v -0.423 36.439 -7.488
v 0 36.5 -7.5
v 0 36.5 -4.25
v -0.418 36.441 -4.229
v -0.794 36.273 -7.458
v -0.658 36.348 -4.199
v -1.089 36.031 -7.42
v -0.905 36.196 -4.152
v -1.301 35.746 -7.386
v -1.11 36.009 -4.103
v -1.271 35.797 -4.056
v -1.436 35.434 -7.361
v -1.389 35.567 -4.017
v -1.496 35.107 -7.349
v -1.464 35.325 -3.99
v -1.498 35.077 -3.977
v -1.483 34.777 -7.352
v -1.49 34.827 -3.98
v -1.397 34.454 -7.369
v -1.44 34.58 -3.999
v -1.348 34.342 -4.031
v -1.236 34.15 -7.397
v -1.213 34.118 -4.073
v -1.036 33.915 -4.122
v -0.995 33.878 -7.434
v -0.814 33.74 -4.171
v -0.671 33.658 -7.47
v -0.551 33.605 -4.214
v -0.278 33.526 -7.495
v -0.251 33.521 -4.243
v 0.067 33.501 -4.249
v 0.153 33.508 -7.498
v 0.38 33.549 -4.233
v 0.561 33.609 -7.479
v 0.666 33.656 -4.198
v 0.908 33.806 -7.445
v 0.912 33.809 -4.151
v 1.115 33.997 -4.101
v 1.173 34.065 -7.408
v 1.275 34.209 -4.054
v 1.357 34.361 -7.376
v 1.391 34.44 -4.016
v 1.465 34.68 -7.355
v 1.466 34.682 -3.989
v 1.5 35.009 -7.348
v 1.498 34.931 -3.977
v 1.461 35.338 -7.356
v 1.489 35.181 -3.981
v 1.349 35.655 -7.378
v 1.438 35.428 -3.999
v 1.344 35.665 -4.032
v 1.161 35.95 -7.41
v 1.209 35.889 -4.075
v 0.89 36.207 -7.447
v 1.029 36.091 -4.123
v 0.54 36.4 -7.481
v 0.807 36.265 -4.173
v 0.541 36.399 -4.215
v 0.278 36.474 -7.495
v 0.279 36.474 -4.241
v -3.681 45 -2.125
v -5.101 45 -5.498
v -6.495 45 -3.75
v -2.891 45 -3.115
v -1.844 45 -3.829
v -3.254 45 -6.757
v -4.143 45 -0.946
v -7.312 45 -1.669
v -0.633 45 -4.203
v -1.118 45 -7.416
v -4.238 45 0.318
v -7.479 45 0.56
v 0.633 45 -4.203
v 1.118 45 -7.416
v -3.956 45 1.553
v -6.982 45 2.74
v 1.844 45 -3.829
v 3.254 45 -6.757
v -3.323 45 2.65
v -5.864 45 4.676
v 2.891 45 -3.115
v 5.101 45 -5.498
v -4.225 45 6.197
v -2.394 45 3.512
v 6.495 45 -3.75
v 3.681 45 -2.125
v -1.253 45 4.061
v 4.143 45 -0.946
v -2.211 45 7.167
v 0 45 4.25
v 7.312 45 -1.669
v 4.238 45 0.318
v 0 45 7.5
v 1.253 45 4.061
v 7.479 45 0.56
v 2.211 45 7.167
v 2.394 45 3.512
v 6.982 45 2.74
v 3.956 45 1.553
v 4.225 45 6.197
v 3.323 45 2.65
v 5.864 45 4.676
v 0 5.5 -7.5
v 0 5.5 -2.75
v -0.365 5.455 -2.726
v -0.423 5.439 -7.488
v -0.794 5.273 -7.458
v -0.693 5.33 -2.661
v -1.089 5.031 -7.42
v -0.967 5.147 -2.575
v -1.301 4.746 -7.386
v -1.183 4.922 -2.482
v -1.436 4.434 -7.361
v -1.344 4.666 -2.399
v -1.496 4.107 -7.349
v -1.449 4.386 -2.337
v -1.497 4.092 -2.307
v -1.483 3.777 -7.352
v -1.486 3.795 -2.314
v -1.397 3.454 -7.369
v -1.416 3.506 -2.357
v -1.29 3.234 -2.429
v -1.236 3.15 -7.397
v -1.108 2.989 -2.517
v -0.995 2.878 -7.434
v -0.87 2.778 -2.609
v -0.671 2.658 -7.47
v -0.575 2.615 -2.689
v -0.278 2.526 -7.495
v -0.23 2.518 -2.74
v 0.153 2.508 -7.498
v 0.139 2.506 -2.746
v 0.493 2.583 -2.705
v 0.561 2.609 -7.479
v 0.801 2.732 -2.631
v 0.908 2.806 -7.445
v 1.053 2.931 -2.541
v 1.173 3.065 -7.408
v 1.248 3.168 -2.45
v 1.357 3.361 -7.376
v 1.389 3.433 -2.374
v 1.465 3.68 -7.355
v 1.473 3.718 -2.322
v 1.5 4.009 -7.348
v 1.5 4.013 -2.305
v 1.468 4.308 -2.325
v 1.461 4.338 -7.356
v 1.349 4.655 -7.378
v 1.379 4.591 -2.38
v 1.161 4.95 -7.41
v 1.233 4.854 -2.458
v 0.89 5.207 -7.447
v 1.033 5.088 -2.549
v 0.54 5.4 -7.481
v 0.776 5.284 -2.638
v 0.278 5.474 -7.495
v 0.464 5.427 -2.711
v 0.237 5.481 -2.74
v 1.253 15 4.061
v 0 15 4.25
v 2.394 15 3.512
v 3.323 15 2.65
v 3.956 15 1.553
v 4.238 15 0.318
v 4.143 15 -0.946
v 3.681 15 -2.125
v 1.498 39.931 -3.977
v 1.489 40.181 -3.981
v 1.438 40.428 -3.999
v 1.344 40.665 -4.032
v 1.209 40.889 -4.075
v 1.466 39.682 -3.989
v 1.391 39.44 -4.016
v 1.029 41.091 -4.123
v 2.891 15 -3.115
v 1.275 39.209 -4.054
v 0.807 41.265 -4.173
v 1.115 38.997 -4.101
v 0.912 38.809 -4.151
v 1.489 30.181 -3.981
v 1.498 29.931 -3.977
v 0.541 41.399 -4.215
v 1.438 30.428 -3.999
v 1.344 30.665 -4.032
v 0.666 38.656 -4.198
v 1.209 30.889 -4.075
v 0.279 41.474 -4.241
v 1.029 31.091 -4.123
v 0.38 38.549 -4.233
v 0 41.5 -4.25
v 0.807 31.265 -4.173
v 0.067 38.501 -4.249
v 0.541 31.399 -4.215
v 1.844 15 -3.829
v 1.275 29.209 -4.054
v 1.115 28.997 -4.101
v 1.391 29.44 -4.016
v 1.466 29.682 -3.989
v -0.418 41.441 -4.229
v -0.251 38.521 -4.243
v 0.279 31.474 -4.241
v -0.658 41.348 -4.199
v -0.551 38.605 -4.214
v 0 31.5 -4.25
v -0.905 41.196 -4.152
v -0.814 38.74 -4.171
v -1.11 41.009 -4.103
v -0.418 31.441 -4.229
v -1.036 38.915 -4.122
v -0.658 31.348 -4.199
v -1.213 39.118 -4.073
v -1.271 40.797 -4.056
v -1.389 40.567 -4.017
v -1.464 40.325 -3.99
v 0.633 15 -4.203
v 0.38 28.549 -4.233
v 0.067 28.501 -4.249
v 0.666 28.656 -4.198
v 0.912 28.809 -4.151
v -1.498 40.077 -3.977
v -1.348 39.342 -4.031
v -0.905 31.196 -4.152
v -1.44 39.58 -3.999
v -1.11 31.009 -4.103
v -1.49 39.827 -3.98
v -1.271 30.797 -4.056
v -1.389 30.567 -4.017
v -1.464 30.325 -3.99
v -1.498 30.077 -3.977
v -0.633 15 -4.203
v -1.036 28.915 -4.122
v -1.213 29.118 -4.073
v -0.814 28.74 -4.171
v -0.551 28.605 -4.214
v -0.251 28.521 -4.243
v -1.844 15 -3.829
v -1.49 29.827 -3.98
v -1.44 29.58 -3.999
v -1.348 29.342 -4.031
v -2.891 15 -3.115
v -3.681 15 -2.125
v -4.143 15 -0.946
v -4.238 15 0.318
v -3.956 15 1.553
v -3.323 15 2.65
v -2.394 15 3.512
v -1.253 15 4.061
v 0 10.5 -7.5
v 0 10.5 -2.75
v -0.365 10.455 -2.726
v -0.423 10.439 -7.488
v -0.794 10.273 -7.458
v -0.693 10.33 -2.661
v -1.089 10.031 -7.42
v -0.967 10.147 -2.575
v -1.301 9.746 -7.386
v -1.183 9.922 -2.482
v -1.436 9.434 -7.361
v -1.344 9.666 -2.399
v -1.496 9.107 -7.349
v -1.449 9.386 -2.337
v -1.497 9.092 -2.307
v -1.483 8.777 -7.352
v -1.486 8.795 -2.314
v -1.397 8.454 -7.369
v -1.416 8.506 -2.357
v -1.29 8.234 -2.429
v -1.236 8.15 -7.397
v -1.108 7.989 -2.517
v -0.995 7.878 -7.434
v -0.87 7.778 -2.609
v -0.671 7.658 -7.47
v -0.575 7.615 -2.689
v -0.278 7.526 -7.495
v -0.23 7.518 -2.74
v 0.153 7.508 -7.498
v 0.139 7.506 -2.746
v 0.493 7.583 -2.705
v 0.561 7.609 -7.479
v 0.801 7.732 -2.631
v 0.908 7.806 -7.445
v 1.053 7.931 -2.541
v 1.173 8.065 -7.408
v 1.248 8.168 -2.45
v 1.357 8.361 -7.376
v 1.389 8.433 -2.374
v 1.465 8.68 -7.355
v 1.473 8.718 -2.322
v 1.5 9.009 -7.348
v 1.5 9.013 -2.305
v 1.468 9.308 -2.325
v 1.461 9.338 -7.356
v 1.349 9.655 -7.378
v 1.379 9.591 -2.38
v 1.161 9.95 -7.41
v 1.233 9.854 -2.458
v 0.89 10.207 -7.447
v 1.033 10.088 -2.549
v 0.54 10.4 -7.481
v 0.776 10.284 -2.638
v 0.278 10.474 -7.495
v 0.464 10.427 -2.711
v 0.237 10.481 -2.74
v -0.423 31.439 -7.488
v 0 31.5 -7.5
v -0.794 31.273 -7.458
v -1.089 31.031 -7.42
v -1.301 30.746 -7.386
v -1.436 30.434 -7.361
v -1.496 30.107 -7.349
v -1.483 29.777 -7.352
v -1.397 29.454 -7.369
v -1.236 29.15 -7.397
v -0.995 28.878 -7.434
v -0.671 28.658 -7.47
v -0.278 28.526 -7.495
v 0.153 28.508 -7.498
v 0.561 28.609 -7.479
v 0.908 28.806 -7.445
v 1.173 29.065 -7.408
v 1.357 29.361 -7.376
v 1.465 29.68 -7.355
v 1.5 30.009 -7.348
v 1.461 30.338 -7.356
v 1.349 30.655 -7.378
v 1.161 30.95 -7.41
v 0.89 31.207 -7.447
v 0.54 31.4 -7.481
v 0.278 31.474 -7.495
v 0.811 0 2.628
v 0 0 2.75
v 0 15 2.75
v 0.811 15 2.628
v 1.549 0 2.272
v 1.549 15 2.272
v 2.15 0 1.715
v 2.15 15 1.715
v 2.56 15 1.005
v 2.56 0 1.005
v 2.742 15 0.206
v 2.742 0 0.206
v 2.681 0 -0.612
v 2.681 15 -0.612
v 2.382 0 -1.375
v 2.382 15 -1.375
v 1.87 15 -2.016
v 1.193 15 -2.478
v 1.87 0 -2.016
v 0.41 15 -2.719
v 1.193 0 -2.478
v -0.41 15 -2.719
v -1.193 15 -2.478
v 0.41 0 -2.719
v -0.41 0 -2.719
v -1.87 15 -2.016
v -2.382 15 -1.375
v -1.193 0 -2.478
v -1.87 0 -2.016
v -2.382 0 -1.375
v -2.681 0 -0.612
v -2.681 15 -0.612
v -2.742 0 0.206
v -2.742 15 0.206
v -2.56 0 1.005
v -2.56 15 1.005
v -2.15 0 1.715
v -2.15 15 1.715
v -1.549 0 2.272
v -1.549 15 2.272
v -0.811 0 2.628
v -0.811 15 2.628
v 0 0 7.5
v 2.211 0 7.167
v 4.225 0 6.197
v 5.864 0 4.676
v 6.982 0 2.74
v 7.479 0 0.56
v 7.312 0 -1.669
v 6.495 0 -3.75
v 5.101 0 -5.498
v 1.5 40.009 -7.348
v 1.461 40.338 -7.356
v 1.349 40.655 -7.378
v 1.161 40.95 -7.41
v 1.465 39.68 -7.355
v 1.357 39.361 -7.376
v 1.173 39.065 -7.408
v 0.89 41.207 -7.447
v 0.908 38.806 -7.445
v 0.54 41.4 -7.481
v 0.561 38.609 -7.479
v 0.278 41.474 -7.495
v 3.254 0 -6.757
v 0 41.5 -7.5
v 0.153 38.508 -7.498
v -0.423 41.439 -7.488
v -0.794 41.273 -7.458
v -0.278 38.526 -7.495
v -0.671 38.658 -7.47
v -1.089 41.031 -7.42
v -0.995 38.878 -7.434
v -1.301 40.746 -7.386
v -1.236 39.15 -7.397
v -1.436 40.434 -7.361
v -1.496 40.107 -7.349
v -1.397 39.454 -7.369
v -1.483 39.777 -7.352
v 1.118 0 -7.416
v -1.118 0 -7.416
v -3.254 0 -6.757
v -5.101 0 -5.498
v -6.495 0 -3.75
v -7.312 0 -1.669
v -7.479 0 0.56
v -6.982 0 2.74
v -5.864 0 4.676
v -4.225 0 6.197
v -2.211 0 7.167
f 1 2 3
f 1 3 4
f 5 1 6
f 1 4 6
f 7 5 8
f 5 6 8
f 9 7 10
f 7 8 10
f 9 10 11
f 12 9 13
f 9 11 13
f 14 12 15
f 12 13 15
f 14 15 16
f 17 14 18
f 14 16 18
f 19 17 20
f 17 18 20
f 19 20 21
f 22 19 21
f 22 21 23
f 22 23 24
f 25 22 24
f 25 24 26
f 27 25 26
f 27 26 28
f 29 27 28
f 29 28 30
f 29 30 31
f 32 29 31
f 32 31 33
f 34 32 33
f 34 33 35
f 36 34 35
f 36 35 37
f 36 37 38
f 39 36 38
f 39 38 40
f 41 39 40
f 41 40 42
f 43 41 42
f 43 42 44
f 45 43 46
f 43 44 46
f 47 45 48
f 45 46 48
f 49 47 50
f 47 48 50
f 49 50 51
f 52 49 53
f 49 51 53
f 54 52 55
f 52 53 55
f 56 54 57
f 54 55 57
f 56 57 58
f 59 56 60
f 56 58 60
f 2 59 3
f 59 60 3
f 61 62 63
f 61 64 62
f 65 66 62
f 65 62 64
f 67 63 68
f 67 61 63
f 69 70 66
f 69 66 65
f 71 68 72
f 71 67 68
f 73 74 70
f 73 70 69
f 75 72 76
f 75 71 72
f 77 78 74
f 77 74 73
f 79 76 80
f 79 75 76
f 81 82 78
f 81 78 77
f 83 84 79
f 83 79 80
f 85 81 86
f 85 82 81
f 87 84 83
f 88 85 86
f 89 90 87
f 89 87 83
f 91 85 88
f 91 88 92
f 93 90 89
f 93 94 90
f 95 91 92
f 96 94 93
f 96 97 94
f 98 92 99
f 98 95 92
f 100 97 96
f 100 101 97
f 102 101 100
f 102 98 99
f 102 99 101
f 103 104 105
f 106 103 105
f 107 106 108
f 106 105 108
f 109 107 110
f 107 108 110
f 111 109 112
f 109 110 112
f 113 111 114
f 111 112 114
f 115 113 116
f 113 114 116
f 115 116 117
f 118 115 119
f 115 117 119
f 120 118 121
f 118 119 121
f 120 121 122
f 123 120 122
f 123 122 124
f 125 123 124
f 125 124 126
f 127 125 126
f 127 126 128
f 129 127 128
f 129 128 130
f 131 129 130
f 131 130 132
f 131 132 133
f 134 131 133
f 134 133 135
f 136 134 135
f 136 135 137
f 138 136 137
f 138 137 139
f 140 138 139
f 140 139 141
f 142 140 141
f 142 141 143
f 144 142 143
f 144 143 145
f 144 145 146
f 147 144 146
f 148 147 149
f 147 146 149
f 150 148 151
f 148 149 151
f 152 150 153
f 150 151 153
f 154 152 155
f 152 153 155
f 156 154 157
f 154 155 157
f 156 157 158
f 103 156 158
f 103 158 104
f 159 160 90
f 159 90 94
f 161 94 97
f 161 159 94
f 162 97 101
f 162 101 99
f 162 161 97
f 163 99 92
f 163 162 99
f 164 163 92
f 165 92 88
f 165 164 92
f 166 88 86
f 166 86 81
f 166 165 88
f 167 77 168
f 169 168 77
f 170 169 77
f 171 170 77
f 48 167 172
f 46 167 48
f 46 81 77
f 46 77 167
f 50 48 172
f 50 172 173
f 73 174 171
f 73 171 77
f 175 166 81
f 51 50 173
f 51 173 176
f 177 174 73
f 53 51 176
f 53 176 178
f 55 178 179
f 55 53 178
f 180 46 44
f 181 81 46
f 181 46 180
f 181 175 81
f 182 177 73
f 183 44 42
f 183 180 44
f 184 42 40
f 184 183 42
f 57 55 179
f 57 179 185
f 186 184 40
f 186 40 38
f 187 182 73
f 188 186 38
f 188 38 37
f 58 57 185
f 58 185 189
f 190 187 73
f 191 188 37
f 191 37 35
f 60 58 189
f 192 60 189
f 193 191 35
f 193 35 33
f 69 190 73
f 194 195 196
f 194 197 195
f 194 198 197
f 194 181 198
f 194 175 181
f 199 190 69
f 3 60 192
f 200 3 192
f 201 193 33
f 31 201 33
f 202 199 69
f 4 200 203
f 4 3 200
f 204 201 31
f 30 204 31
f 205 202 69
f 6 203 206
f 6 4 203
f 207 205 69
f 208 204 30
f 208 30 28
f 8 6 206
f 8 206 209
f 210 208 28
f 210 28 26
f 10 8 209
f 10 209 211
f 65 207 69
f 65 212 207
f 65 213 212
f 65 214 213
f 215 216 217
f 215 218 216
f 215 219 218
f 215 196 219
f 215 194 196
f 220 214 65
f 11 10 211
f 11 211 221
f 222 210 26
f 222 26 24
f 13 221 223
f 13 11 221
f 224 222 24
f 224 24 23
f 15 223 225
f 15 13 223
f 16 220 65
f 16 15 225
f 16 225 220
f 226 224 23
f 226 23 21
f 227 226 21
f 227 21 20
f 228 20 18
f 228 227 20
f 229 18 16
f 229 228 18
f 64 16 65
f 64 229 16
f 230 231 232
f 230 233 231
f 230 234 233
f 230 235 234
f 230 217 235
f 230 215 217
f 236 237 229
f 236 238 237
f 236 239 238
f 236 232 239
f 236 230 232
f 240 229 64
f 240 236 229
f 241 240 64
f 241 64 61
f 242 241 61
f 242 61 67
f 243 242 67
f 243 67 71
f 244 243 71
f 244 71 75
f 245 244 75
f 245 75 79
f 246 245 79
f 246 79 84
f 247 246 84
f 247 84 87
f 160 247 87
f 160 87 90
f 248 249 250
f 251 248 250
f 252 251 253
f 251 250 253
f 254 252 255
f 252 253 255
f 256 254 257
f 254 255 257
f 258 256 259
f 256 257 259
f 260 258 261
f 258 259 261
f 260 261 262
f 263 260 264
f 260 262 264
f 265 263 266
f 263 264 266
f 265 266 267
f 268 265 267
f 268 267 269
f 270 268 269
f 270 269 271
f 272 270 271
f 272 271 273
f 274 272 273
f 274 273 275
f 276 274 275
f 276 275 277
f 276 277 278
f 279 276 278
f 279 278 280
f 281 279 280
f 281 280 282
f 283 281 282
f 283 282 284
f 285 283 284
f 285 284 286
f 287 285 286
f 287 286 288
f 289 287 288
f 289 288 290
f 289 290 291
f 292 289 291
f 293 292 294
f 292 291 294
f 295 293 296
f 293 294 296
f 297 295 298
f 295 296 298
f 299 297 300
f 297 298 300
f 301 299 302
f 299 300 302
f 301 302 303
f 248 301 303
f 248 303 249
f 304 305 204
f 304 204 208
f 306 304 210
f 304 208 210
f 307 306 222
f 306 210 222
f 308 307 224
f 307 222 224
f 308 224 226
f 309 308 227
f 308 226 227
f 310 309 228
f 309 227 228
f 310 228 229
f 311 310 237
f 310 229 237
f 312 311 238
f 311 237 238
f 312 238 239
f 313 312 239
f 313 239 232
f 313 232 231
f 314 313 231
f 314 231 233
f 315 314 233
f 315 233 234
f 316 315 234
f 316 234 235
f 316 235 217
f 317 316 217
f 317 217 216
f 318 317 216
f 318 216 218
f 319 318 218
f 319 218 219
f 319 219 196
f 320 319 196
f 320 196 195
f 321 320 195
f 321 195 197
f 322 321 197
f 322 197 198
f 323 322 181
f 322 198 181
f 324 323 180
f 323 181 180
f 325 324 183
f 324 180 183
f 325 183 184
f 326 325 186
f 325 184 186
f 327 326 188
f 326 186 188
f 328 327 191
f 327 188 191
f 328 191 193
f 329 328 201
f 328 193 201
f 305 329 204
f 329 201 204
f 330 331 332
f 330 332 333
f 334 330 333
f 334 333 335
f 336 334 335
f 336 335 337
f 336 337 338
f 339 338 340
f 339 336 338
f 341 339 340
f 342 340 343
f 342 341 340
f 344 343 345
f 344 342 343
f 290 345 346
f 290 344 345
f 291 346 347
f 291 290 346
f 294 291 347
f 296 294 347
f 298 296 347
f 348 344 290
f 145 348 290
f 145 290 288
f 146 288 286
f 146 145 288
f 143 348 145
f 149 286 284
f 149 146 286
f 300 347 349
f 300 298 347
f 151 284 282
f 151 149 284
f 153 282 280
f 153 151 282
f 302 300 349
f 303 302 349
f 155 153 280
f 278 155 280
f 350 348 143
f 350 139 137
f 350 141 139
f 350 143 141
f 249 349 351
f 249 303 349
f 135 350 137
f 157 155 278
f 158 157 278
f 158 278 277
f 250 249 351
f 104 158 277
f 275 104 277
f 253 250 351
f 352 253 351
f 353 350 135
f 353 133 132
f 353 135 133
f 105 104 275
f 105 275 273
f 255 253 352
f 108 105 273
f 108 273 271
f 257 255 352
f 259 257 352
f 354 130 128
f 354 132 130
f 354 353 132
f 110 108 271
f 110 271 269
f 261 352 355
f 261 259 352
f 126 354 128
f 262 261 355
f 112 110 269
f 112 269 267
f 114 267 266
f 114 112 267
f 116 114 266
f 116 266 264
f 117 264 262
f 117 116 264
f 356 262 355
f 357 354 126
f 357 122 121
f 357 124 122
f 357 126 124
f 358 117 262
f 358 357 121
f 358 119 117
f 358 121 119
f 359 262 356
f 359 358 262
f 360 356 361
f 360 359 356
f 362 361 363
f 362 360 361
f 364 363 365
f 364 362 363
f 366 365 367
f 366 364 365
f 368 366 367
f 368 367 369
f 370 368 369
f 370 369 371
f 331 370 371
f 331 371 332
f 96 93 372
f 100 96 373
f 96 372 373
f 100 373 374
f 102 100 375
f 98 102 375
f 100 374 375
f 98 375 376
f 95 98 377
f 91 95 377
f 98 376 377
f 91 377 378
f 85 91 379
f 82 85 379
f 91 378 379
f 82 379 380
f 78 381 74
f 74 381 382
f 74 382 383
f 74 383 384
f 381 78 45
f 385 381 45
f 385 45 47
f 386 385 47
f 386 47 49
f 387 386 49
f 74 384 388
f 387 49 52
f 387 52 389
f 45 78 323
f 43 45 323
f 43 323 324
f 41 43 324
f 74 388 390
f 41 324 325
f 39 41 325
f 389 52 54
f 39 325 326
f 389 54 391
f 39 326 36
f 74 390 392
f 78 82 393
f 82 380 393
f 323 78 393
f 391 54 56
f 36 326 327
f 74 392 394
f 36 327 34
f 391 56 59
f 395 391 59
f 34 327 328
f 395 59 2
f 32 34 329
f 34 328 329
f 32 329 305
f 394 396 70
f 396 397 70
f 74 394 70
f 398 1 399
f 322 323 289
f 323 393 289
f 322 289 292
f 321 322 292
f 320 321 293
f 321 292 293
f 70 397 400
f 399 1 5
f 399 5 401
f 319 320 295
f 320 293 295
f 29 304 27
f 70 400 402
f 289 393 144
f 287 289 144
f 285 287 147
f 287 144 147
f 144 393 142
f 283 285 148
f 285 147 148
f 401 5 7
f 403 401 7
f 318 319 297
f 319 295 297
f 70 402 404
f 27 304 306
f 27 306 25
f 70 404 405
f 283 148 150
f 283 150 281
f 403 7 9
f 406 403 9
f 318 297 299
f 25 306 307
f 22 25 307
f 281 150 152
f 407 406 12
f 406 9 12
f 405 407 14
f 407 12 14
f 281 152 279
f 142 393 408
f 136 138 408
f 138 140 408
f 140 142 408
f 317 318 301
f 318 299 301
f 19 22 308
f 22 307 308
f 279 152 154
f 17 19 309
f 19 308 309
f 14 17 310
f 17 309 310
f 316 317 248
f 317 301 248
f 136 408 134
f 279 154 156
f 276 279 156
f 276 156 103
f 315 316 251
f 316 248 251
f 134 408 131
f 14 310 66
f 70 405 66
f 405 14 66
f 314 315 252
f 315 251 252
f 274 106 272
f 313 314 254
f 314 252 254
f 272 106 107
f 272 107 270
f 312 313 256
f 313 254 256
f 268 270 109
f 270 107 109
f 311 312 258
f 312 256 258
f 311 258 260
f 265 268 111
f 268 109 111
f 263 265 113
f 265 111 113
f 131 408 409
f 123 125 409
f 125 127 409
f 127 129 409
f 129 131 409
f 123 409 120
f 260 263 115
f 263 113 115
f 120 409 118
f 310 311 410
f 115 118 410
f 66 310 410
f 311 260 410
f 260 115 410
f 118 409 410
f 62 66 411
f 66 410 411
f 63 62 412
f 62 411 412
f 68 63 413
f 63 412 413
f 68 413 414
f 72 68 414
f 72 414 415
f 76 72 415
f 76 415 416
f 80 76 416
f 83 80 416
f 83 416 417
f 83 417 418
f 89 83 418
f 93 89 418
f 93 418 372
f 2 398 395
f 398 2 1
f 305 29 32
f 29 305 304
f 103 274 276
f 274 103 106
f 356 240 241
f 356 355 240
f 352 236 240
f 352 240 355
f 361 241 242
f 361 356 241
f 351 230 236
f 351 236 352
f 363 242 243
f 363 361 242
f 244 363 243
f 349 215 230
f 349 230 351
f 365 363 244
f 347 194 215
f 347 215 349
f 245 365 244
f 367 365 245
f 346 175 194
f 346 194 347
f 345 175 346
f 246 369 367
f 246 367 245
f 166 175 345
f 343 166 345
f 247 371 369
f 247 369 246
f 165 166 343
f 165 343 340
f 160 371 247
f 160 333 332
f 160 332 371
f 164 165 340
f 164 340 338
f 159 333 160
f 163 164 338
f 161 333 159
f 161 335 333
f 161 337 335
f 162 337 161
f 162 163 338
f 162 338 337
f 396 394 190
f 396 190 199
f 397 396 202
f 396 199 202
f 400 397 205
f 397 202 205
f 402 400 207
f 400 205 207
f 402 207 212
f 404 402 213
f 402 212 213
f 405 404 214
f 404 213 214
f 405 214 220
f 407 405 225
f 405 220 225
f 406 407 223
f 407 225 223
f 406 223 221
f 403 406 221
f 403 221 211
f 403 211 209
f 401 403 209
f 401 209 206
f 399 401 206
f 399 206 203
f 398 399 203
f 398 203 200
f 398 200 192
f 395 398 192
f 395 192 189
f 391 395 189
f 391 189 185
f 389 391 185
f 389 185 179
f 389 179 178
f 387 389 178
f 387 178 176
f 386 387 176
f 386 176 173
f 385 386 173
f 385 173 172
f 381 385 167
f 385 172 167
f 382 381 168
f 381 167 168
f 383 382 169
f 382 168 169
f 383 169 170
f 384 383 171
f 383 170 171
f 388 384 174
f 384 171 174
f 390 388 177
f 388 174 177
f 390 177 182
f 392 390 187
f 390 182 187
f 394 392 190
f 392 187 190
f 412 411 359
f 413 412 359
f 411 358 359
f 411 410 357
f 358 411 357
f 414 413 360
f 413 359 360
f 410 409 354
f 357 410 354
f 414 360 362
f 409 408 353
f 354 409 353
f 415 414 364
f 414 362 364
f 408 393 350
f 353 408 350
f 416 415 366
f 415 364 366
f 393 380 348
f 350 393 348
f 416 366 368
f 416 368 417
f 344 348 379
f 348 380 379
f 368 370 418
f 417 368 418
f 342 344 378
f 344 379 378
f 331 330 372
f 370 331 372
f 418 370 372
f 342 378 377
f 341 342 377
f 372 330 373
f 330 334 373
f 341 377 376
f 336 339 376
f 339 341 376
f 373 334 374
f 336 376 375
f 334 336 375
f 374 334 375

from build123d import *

# Parameters (mm, degrees)
IZIM1_R                     = 7.5
IZIM1_R_2                   = 2.75
Y_KSEKLIK_EKSTR_ZYON1_DEPTH = 15
IZIM2_R                     = 7.5
IZIM2_R_2                   = 4.25
Y_KSEKLIK_EKSTR_ZYON2_DEPTH = 30
IZIM3_R                     = 1.5
KES_EKSTR_ZYON1_DEPTH       = 30


with BuildPart() as part:
    # Çizim1 → Yükseklik-Ekstrüzyon1 (new body)
    with BuildSketch(Plane(origin=(0, 0, 0), x_dir=(1, 0, 0), z_dir=(0, 1, 0))):
        with Locations(Location((0, 0, 0), (0, 0, 270))):
            Circle(IZIM1_R)
        with Locations(Location((0, 0, 0), (0, 0, 270))):
            Circle(IZIM1_R_2, mode=Mode.SUBTRACT)
    extrude(amount=Y_KSEKLIK_EKSTR_ZYON1_DEPTH)

    # Çizim2 → Yükseklik-Ekstrüzyon2 (add)
    with BuildSketch(Plane(origin=(0, 15, 0), x_dir=(1, 0, 0), z_dir=(0, 1, 0))):
        with Locations(Location((0, 0, 0), (0, 0, 270))):
            Circle(IZIM2_R)
        with Locations(Location((0, 0, 0), (0, 0, 270))):
            Circle(IZIM2_R_2, mode=Mode.SUBTRACT)
    extrude(amount=Y_KSEKLIK_EKSTR_ZYON2_DEPTH)

    # Çizim3 → Kes-Ekstrüzyon1 (cut)
    with BuildSketch(Plane.XY):
        with Locations(Location((0, 40, 0), (0, 0, 90))):
            Circle(IZIM3_R)
        with Locations(Location((0, 35, 0), (0, 0, 90))):
            Circle(IZIM3_R)
        with Locations(Location((0, 30, 0), (0, 0, 90))):
            Circle(IZIM3_R)
        with Locations(Location((0, 9, 0), (0, 0, 90))):
            Circle(IZIM3_R)
        with Locations(Location((0, 4, 0), (0, 0, 90))):
            Circle(IZIM3_R)
    extrude(amount=-KES_EKSTR_ZYON1_DEPTH, mode=Mode.SUBTRACT)


solid = part.part
